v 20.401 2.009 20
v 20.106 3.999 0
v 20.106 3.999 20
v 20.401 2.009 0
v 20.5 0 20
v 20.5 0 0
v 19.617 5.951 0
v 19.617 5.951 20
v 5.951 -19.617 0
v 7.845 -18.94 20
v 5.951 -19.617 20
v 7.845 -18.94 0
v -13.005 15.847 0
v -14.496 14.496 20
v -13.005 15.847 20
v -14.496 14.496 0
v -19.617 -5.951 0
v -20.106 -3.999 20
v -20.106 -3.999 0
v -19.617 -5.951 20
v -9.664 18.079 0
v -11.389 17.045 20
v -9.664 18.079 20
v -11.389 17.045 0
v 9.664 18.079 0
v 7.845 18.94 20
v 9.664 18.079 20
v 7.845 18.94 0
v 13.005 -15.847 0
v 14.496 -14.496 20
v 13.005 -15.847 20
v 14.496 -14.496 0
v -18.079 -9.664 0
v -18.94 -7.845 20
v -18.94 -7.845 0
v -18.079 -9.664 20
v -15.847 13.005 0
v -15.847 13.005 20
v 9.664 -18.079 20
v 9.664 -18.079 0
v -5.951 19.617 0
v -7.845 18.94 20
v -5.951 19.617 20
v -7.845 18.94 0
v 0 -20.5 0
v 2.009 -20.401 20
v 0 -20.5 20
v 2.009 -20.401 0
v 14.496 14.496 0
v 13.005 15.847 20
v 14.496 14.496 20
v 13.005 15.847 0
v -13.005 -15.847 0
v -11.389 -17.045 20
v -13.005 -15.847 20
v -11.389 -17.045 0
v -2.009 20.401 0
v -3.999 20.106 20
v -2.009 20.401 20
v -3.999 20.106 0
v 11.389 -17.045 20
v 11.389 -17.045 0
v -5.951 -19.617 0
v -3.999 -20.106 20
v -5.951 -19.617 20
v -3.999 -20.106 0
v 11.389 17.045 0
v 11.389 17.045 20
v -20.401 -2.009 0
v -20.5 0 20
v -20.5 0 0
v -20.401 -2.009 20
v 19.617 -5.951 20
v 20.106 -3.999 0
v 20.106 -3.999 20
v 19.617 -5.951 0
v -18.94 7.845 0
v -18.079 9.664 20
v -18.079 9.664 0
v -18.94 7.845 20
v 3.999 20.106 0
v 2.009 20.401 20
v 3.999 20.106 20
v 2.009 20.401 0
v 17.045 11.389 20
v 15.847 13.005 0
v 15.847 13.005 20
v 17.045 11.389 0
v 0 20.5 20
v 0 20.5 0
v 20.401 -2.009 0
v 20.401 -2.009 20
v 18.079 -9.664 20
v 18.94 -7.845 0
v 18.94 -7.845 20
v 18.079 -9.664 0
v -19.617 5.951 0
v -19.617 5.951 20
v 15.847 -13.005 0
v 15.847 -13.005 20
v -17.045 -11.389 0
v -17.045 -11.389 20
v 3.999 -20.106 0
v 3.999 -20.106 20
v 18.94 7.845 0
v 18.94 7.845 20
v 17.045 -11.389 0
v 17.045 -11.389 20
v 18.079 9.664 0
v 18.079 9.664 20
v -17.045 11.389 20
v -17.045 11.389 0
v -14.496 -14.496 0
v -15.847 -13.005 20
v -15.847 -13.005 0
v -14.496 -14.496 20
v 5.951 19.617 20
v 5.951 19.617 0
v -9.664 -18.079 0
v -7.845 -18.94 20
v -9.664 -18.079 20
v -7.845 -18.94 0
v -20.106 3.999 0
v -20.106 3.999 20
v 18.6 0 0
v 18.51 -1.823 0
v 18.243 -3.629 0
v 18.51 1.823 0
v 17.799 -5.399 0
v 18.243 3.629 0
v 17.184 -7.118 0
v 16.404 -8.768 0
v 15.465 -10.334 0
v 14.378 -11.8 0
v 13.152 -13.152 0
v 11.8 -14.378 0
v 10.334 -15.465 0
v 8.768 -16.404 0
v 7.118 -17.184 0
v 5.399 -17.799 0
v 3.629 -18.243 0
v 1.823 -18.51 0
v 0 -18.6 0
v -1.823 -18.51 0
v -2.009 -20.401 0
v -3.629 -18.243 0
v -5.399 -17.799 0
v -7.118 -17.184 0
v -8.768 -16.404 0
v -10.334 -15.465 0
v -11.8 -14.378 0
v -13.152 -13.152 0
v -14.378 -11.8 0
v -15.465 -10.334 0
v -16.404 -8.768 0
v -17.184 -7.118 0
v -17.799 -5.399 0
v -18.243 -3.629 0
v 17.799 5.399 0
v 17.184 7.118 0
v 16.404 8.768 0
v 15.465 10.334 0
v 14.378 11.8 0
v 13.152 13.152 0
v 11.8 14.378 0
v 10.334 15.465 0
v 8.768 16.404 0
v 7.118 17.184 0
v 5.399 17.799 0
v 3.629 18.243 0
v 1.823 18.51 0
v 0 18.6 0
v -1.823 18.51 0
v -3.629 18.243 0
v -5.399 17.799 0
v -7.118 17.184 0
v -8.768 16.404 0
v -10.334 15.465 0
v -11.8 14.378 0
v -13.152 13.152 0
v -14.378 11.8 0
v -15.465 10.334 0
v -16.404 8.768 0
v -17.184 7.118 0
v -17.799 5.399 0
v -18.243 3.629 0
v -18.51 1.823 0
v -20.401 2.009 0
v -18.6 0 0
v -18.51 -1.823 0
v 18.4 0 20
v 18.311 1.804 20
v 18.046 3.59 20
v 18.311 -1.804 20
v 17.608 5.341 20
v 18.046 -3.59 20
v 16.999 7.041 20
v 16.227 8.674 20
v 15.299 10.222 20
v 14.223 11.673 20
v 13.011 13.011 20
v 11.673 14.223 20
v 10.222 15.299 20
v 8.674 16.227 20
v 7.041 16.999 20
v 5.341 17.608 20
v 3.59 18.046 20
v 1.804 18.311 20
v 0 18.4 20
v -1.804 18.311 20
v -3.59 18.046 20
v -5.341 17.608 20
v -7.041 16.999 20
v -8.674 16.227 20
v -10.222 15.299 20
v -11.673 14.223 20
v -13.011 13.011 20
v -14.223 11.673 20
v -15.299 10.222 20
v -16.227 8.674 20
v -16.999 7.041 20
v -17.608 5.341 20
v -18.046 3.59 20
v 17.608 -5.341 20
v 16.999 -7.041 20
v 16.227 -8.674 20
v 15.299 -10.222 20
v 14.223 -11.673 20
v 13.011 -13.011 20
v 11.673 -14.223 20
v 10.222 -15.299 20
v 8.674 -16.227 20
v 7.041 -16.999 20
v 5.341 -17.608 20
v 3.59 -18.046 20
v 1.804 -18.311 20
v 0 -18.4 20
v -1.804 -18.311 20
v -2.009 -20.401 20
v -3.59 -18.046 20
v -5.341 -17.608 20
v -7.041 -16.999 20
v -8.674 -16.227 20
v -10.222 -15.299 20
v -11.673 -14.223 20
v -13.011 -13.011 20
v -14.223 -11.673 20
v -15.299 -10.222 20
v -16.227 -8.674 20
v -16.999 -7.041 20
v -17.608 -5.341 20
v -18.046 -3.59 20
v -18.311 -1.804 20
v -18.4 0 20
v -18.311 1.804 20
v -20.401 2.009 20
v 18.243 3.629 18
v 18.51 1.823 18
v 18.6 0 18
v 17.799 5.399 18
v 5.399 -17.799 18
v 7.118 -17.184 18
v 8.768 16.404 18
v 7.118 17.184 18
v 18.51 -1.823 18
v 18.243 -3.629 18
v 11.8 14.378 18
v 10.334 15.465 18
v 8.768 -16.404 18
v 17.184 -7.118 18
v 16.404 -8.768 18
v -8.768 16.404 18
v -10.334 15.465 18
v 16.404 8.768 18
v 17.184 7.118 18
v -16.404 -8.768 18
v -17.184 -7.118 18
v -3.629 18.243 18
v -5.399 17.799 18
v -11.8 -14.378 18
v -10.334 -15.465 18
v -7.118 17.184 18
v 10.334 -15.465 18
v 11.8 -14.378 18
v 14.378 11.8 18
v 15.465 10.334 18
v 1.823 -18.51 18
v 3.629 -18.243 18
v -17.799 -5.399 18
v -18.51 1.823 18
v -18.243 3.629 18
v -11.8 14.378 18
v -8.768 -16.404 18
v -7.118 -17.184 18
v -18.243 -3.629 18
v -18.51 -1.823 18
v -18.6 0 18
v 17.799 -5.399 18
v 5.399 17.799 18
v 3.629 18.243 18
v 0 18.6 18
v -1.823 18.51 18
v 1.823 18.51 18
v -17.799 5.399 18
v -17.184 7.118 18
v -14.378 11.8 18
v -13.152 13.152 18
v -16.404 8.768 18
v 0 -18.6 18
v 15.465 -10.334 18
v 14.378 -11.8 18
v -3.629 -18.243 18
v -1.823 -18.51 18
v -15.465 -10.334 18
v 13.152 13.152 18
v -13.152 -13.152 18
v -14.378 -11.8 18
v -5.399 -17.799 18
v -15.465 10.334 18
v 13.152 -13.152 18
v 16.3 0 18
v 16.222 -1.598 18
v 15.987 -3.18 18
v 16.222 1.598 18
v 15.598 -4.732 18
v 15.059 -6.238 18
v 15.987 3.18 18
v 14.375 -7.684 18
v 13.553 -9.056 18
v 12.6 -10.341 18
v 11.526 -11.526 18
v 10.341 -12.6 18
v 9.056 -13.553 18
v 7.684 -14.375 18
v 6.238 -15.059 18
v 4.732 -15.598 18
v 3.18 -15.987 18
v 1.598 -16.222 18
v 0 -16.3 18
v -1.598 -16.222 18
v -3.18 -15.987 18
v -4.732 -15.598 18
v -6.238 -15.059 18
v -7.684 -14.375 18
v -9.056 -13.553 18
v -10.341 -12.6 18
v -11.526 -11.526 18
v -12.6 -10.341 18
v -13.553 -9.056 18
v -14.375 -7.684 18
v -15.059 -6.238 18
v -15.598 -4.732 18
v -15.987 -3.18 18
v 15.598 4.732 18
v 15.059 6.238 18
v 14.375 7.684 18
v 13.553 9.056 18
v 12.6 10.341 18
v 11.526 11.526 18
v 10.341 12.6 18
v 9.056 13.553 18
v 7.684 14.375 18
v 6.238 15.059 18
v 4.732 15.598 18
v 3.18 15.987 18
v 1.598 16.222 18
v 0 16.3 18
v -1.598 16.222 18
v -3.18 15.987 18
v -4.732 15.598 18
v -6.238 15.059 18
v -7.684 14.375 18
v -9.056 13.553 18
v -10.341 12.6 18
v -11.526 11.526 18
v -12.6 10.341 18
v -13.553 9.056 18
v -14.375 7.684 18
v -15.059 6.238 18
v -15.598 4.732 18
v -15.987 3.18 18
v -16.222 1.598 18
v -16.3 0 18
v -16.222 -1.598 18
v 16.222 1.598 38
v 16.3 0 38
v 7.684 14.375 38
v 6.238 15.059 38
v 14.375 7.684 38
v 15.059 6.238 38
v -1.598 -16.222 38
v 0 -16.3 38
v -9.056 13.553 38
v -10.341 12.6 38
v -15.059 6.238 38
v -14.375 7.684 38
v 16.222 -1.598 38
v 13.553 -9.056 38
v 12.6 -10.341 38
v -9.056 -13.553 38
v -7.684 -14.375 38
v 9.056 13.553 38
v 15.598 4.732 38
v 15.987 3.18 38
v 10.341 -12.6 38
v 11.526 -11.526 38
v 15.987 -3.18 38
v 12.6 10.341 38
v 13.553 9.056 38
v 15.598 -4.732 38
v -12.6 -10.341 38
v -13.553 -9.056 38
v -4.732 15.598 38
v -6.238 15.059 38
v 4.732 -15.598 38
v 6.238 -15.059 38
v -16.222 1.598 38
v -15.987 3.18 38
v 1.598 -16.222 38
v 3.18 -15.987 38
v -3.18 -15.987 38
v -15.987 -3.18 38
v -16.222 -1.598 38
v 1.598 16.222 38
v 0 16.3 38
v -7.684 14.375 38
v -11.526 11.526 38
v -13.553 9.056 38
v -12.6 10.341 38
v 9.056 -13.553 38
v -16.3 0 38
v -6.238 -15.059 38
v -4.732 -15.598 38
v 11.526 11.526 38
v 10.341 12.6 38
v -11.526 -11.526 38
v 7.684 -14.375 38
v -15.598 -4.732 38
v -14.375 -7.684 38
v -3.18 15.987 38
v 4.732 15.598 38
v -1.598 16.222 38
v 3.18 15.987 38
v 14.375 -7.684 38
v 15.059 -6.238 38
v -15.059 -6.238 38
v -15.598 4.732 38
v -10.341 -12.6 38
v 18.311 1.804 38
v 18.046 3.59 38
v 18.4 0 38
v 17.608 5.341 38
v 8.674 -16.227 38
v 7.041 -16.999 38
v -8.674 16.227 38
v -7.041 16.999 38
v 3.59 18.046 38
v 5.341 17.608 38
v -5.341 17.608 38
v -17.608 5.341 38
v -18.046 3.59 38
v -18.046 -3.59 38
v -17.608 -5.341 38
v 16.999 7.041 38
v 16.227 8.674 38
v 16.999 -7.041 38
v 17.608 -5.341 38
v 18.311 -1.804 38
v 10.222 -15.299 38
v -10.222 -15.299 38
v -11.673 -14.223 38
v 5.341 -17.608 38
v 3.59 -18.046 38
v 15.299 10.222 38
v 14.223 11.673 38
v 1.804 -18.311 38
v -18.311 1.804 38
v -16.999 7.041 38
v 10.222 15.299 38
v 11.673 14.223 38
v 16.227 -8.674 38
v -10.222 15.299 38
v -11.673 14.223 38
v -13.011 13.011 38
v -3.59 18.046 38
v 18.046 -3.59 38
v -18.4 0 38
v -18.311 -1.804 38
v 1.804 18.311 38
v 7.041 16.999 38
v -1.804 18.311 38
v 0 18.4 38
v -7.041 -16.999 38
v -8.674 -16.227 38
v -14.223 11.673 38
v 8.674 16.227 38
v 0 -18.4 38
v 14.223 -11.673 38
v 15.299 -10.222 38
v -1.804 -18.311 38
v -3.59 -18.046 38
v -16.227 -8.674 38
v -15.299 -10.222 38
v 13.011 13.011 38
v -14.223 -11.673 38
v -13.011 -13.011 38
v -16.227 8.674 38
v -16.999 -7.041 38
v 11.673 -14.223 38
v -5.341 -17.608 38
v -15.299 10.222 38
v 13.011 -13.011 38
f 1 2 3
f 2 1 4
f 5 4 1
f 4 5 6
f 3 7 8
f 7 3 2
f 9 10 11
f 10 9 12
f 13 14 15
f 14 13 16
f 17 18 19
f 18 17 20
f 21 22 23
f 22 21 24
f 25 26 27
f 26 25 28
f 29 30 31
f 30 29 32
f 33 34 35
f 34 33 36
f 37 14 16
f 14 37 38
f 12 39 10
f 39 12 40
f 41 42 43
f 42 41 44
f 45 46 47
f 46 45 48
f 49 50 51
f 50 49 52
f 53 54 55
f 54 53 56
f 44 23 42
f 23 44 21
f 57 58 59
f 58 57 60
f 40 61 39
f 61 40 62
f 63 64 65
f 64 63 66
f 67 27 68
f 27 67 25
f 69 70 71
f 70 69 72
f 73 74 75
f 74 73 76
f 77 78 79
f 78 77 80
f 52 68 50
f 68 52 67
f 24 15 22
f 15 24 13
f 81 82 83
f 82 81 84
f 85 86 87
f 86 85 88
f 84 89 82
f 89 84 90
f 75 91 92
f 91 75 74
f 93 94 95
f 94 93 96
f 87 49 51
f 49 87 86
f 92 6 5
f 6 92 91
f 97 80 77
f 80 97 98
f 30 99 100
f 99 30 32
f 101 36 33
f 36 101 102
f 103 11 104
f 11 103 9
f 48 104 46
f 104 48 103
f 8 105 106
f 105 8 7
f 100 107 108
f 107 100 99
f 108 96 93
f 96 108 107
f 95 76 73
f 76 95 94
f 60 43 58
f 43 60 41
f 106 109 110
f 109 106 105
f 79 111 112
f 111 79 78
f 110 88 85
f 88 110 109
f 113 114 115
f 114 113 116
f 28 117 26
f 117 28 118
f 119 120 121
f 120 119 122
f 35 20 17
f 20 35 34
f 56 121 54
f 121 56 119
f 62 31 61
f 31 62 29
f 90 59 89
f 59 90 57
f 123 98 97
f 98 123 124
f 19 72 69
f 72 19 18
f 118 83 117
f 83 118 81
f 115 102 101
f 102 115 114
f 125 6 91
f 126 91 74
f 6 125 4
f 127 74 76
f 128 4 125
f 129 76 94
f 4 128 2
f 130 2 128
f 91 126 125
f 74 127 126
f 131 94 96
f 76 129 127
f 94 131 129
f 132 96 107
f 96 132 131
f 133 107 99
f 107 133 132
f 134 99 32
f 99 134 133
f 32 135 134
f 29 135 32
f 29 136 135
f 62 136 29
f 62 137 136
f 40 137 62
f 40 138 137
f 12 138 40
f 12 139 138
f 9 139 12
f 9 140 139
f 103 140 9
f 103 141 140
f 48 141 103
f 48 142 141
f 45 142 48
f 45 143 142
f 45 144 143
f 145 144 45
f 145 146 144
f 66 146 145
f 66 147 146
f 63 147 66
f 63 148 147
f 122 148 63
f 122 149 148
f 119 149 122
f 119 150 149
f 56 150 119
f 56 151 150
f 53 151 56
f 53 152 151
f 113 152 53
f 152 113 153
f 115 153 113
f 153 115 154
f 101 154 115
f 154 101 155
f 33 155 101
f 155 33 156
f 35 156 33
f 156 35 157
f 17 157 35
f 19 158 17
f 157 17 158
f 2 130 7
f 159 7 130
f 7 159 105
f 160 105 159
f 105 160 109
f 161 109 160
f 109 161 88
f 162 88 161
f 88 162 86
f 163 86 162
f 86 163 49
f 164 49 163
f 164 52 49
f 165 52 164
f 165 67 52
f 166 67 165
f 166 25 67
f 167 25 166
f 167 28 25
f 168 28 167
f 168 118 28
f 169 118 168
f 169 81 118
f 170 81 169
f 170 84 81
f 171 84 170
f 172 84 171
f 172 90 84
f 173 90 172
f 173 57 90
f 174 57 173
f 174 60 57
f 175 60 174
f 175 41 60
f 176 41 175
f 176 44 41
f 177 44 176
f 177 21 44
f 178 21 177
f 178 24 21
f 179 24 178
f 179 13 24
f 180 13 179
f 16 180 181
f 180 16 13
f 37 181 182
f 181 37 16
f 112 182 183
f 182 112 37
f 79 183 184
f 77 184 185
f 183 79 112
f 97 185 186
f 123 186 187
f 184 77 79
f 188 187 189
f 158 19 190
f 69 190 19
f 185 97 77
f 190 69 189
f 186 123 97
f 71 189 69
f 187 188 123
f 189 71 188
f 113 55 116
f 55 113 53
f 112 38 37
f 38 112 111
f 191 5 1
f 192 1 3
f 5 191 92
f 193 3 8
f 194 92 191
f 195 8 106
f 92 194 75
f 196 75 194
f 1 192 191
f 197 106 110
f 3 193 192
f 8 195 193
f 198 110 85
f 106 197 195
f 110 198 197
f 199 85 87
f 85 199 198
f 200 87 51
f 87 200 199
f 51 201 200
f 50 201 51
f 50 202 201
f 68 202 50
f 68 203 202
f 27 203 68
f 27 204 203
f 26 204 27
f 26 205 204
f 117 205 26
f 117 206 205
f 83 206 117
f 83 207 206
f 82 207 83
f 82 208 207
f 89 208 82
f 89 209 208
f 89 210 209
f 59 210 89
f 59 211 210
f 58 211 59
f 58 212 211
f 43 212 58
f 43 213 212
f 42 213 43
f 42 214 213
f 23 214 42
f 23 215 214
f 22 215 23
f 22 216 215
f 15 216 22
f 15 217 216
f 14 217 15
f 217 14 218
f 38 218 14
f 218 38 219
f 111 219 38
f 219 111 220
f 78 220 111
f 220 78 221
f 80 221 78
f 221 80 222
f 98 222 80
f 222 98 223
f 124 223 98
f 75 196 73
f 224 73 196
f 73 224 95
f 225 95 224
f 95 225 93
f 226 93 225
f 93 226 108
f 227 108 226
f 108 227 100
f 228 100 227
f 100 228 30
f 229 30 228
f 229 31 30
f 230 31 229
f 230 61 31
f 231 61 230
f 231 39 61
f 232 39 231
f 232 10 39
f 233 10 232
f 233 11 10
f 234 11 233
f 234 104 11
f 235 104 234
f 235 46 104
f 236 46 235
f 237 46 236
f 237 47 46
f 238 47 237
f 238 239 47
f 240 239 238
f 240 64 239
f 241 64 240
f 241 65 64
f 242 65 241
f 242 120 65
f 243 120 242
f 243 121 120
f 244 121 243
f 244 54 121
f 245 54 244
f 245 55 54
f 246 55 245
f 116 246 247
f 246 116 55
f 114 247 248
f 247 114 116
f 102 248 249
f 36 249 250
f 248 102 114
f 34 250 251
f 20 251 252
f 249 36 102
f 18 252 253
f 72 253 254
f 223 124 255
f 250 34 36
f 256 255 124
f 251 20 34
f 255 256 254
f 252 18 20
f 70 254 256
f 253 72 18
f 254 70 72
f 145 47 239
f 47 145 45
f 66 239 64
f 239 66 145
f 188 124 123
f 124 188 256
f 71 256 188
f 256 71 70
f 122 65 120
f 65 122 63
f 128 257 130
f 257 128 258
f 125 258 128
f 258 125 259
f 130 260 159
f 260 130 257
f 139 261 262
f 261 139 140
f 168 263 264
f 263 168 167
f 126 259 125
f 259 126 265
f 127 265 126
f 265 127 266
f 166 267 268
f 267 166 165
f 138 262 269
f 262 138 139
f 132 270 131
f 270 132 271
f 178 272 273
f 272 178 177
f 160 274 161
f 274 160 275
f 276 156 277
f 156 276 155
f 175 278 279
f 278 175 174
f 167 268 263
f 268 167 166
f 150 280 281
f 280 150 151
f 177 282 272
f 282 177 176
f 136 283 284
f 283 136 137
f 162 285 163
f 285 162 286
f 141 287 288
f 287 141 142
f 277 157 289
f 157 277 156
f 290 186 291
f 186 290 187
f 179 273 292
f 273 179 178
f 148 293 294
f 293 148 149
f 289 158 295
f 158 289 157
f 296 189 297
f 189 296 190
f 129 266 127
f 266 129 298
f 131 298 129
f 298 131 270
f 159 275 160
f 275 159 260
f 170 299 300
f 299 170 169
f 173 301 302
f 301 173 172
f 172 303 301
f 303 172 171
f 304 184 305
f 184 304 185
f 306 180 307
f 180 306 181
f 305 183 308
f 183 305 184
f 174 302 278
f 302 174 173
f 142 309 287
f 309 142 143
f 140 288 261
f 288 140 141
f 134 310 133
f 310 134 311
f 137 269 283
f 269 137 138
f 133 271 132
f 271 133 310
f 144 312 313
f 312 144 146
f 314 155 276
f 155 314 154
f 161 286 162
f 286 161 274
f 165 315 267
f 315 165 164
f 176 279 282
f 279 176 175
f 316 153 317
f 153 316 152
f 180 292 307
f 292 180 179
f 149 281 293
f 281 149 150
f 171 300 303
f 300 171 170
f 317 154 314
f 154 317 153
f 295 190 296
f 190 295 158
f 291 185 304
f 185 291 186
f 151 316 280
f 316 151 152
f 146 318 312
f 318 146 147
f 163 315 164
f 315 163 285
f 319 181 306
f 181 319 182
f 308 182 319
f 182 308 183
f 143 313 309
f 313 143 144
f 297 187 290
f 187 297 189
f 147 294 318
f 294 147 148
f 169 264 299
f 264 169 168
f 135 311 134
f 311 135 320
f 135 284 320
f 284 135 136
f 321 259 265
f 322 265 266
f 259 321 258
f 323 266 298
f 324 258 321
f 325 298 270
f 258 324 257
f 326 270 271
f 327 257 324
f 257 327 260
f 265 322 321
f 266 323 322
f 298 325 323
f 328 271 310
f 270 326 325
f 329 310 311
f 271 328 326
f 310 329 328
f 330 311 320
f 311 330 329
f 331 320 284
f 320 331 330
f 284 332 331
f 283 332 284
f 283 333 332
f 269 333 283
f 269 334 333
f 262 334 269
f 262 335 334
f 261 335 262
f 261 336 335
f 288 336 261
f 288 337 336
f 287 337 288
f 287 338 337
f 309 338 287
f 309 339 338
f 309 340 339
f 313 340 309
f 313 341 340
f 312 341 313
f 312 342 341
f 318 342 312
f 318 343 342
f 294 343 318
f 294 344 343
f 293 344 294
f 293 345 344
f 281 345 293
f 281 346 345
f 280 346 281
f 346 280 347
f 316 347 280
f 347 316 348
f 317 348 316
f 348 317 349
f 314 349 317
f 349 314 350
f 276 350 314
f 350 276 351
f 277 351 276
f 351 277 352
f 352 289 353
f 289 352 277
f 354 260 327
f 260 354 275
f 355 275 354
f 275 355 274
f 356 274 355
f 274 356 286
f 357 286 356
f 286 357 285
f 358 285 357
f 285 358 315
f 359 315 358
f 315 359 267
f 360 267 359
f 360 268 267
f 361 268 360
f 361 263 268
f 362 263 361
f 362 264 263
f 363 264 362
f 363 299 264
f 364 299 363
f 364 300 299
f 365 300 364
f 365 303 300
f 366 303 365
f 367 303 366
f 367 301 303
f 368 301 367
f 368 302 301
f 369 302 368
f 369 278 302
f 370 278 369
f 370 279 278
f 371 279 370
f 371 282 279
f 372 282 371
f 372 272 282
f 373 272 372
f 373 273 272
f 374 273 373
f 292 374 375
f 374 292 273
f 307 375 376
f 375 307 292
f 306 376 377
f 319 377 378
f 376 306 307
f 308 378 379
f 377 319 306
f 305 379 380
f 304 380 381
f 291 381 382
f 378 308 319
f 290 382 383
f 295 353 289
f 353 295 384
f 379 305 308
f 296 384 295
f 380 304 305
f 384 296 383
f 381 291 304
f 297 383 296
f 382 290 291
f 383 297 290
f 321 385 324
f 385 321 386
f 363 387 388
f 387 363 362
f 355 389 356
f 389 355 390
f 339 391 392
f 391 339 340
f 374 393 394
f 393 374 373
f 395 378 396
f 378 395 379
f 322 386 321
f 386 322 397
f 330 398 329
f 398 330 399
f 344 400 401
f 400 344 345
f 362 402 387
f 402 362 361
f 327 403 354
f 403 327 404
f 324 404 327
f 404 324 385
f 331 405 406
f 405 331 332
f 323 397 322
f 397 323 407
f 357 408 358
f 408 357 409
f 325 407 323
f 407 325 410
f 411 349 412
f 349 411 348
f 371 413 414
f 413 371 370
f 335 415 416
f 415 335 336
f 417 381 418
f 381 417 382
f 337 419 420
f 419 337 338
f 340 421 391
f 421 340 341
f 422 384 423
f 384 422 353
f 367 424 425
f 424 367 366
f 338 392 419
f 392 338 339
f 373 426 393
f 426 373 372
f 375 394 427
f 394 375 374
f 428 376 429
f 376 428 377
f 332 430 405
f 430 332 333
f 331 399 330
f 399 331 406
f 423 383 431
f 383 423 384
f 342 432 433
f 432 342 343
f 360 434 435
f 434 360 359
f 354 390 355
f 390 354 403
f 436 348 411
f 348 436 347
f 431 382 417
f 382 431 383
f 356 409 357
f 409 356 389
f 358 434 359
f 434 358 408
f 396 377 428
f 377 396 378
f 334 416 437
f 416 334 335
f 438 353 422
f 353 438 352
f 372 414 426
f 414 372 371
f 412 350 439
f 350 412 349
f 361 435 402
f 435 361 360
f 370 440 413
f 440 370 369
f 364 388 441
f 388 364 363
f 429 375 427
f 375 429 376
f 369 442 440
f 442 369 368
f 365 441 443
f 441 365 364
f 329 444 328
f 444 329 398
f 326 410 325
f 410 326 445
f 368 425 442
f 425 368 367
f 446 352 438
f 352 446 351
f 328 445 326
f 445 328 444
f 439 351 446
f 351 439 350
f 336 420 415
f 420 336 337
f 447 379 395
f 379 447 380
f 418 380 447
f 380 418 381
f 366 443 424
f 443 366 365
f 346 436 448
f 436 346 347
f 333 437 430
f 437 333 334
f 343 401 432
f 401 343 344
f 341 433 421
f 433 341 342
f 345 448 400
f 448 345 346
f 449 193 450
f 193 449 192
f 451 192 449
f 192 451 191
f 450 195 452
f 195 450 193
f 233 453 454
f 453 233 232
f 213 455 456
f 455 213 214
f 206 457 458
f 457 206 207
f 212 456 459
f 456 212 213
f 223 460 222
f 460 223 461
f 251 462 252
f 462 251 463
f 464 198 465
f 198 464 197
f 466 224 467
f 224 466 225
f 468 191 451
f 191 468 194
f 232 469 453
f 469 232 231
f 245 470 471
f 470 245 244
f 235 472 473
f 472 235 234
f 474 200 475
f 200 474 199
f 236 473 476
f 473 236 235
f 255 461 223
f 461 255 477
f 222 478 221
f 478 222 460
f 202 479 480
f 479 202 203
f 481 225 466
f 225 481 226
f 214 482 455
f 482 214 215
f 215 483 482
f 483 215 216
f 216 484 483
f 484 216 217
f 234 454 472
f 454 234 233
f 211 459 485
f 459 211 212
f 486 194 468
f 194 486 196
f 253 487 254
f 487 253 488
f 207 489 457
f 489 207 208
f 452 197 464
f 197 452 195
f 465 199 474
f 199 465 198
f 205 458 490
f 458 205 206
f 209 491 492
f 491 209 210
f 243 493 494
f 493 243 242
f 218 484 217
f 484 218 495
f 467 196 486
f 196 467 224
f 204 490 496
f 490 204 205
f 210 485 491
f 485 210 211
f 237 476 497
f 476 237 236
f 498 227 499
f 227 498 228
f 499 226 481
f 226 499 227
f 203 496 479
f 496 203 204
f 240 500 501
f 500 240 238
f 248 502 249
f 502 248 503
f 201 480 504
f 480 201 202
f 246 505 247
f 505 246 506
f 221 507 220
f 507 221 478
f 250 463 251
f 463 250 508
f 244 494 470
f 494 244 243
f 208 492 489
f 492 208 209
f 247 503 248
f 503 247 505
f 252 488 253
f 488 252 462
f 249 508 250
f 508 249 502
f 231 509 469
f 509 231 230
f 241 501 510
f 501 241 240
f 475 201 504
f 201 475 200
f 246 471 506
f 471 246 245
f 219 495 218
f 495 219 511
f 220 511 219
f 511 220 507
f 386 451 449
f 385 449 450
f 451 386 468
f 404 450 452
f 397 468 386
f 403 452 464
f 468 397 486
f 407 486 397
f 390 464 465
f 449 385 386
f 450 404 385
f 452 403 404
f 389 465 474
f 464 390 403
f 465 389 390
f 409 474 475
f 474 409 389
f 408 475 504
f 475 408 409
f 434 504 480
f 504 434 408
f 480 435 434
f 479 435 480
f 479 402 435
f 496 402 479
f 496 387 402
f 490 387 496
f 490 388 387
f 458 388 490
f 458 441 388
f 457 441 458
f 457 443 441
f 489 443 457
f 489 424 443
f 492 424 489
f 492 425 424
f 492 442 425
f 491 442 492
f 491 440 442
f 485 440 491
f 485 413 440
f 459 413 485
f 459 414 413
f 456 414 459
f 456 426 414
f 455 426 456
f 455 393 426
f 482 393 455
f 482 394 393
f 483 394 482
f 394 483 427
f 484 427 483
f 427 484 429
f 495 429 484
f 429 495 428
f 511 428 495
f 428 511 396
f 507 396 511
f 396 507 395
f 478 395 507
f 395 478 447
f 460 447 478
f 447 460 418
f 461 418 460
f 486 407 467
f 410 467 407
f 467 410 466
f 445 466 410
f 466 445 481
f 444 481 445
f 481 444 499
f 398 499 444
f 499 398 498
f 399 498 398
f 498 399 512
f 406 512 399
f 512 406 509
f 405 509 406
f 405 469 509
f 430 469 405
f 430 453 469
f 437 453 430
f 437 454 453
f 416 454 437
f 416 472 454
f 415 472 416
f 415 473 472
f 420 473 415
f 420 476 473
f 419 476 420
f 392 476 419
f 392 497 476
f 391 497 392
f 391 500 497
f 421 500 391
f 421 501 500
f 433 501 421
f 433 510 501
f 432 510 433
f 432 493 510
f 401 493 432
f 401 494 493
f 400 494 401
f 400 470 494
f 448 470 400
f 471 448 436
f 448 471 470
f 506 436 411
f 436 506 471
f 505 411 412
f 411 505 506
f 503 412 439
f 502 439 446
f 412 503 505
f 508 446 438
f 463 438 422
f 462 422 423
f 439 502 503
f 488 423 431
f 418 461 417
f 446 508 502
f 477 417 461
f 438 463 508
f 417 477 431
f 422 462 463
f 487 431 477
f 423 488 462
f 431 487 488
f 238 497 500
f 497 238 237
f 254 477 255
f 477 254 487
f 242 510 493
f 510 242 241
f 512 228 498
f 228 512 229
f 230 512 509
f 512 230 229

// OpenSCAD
/*
Parametric Fellowes Monitor Stand Leg

Copyright 2024 nomike[AT]nomike[DOT]com

Redistribution and use in source and binary forms, with or without
modification, are permitted provided that the following conditions are met:

1. Redistributions of source code must retain the above copyright notice, this
list of conditions and the following disclaimer.

2. Redistributions in binary form must reproduce the above copyright notice,
this list of conditions and the following disclaimer in the documentation
and/or other materials provided with the distribution.

THIS SOFTWARE IS PROVIDED BY THE COPYRIGHT HOLDERS AND CONTRIBUTORS “AS IS” AND
ANY EXPRESS OR IMPLIED WARRANTIES, INCLUDING, BUT NOT LIMITED TO, THE IMPLIED
WARRANTIES OF MERCHANTABILITY AND FITNESS FOR A PARTICULAR PURPOSE ARE
DISCLAIMED. IN NO EVENT SHALL THE COPYRIGHT HOLDER OR CONTRIBUTORS BE LIABLE FOR
ANY DIRECT, INDIRECT, INCIDENTAL, SPECIAL, EXEMPLARY, OR CONSEQUENTIAL DAMAGES
(INCLUDING, BUT NOT LIMITED TO, PROCUREMENT OF SUBSTITUTE GOODS OR SERVICES;
LOSS OF USE, DATA, OR PROFITS; OR BUSINESS INTERRUPTION) HOWEVER CAUSED AND ON
ANY THEORY OF LIABILITY, WHETHER IN CONTRACT, STRICT LIABILITY, OR TORT
(INCLUDING NEGLIGENCE OR OTHERWISE) ARISING IN ANY WAY OUT OF THE USE OF THIS
SOFTWARE, EVEN IF ADVISED OF THE POSSIBILITY OF SUCH DAMAGE.

*/

/* [height] */
base_height = 20;


/* [if you change any of these values, the legs might no longer fit] */
base_outer_diameter = 20.5;
base_inner_diameter = 18.6;

top_height = 18;
top_outer_diameter = 18.4;
top_inner_diameter = 16.3;


min_base_height = 18;

_total_height = base_height + top_height;

$fn = 64;

union() {
    difference() {
        cylinder(h = max(base_height, min_base_height), r = base_outer_diameter);
        cylinder(h = max(base_height, min_base_height), r = base_inner_diameter);
    }
    
    difference() {
        translate([0, 0, max(base_height, min_base_height) - 2]) cylinder(h = 2, r = base_inner_diameter);
        translate([0, 0, max(base_height, min_base_height) - 2]) cylinder(h = 2, r = top_inner_diameter);
    }
    
    translate([0, 0, max(base_height, min_base_height)]) difference() {
        cylinder(h = top_height, r = top_outer_diameter);
        cylinder(h = top_height, r = top_inner_diameter);
    }
    
}
